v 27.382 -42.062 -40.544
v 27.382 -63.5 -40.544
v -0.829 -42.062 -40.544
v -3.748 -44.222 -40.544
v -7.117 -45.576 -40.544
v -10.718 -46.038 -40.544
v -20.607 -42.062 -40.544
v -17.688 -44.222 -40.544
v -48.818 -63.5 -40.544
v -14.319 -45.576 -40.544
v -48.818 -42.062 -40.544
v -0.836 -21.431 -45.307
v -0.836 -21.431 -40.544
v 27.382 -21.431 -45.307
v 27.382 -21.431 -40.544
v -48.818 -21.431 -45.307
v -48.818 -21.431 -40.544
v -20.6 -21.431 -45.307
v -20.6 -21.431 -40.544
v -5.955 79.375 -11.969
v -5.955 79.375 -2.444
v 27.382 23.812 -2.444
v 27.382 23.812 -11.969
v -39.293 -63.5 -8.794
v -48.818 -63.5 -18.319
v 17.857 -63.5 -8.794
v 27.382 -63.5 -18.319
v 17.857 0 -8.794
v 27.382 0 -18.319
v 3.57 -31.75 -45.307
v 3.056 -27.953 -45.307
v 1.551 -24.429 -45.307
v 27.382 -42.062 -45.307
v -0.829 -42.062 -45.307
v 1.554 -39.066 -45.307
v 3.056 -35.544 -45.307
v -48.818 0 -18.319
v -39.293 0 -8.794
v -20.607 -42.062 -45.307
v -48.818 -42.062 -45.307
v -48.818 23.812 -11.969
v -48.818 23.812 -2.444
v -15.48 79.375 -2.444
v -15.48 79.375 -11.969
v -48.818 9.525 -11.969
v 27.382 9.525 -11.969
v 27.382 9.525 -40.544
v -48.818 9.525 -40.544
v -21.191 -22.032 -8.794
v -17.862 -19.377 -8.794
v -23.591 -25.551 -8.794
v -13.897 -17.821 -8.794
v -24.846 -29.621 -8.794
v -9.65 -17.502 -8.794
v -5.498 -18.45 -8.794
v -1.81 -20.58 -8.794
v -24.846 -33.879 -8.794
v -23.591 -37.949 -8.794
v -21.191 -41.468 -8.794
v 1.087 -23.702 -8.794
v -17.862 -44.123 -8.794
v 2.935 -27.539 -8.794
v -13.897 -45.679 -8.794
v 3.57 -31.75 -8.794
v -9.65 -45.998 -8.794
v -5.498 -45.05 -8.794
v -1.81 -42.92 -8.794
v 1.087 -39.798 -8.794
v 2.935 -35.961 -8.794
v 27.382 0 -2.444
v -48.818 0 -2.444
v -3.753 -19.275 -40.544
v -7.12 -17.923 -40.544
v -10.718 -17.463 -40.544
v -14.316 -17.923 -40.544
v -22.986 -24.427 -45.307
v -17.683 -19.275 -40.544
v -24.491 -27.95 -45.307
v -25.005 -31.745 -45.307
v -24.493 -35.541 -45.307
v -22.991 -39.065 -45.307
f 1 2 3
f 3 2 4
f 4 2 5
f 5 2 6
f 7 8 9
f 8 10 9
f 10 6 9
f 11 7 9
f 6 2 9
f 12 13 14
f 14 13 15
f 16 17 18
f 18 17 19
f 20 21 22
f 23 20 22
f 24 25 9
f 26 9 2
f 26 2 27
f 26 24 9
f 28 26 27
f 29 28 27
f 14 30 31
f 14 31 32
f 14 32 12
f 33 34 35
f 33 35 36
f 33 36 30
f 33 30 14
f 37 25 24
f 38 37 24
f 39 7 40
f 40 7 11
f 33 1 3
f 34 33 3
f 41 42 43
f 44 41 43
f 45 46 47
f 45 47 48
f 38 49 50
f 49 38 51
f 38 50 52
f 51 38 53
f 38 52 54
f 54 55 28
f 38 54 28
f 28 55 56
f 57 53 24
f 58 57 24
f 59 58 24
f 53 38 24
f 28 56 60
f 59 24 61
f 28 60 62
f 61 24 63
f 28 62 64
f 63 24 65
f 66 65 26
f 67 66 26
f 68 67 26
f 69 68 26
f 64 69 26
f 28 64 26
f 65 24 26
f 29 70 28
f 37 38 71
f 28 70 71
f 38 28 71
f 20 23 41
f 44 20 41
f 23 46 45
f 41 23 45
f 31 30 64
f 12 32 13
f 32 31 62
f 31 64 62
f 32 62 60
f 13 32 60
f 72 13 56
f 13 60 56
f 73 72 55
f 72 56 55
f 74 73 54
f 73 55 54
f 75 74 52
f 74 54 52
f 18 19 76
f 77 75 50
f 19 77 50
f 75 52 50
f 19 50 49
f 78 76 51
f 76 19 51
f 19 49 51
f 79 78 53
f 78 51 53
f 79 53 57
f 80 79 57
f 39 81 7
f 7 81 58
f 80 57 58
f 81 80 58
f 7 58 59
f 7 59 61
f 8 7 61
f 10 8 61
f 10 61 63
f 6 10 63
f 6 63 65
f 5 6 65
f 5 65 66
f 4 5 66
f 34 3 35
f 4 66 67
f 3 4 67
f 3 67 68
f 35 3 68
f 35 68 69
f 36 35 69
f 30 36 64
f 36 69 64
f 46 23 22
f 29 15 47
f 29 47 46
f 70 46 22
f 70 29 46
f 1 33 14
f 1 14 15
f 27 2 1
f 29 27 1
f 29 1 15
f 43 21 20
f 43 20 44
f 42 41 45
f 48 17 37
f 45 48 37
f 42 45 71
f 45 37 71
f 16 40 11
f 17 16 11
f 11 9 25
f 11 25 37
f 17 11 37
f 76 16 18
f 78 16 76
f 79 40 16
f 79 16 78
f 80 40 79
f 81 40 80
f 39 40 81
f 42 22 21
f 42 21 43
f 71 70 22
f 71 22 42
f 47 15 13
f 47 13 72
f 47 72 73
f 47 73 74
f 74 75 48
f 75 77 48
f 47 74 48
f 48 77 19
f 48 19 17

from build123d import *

# Parameters (mm, degrees)
F1_DEPTH  = 63.5
F2_W      = 76.2
F2_H      = 4.7625
F3_DEPTH  = 103.378
F5_DEPTH  = 9.525
F6_W      = 57.15
F6_H      = 9.525
F7_DEPTH  = 6.35
F9_DEPTH  = 9.525
F10_W     = 76.2
F10_H     = 9.525
F11_DEPTH = 23.8125
F12_W     = 76.2
F12_H     = 9.525
F13_DEPTH = 46.0375
F15_DEPTH = 25.4
F17_DEPTH = 4.7625
F19_DEPTH = 54.356


with BuildPart() as f1:
    # F0 (on Front) → F1 (new body)
    with BuildSketch(Plane.XZ):
        Polygon((-48.8179810345, -18.3191206306), (-48.8179810345, -45.3066206306), (27.3820189655, -45.3066206306), (27.3820189655, -18.3191206306), (17.8570189655, -8.7941206306), (-39.2929810345, -8.7941206306), align=None)
    extrude(amount=F1_DEPTH)

    # F2 (on face) → F3 (cut)
    with BuildSketch(Plane.XZ.offset(63.5)):
        with Locations((-10.7179810345, -42.9253706306)):
            Rectangle(F2_W, F2_H)
    extrude(amount=-F3_DEPTH, mode=Mode.SUBTRACT)

    # F4 (on face) → F5 (join)
    with BuildSketch(Plane(origin=(0, 0, 0), x_dir=(-1, 0, 0), z_dir=(0, 1, 0))):
        Polygon((48.8179810345, -18.3191206306), (39.2929810345, -8.7941206306), (-17.8570189655, -8.7941206306), (-27.3820189655, -18.3191206306), (-27.3820189655, -40.5441206306), (48.8179810345, -40.5441206306), align=None)
    extrude(amount=F5_DEPTH)

    # F6 (on face) → F7 (join)
    with BuildSketch(Plane.XY.offset(-8.7941206306)):
        with Locations((-10.7179810345, 4.7625)):
            Rectangle(F6_W, F6_H)
    extrude(amount=F7_DEPTH)

    # F8 (on face) → F9 (join)
    with BuildSketch(Plane(origin=(0, 9.525, 0), x_dir=(-1, 0, 0), z_dir=(0, 1, 0))):
        Polygon((-17.8570189655, -8.7941206306), (-17.8570189655, -2.4441206306), (-27.3820189655, -2.4441206306), (-27.3820189655, -18.3191206306), align=None)
        Polygon((48.8179810345, -2.4441206306), (39.2929810345, -2.4441206306), (39.2929810345, -8.7941206306), (48.8179810345, -18.3191206306), align=None)
    extrude(amount=-F9_DEPTH)

    # F10 (on face) → F11 (join)
    with BuildSketch(Plane(origin=(0, 9.525, 0), x_dir=(-1, 0, 0), z_dir=(0, 1, 0))):
        with Locations((10.7179810345, -7.2066206306)):
            Rectangle(F10_W, F10_H)
    extrude(amount=F11_DEPTH)

    # F12 (on face) → F13 (join)
    with BuildSketch(Plane(origin=(0, 33.3375, 0), x_dir=(-1, 0, 0), z_dir=(0, 1, 0))):
        with Locations((10.7179810345, -7.2066206306)):
            Rectangle(F12_W, F12_H)
    extrude(amount=F13_DEPTH)

    # F14 (on face) → F15 (cut)
    with BuildSketch(Plane.XY.offset(-2.4441206306)):
        Polygon((-48.8179810345, 23.8125), (-15.4804810345, 79.375), (-48.8179810345, 79.375), align=None)
        Polygon((27.3820189655, 79.375), (-5.9554810345, 79.375), (27.3820189655, 23.8125), align=None)
    extrude(amount=-F15_DEPTH, mode=Mode.SUBTRACT)

    # F16 (on face) → F17 (join)
    with BuildSketch(Plane(origin=(0, 0, -40.5441206306), x_dir=(1, 0, 0), z_dir=(0, 0, -1))):
        Polygon((27.3820189655, 31.75), (27.3820189655, 42.0624), (-48.8179810345, 42.0624), (-48.8179810345, 21.43125), (27.3820189655, 21.43125), align=None)
    extrude(amount=F17_DEPTH)

    # F18 (on face) → F19 (cut)
    with BuildSketch(Plane.XY.offset(-8.7941206306)):
        with BuildLine():
            ThreePointArc((-10.7179810345, -46.0375), (-0.6151928983, -41.8527881362), (3.5695189655, -31.75))
            ThreePointArc((3.5695189655, -31.75), (-20.8207691707, -21.6472118638), (-10.7179810345, -46.0375))
        make_face()
    extrude(amount=-F19_DEPTH, mode=Mode.SUBTRACT)


solid = f1.part
